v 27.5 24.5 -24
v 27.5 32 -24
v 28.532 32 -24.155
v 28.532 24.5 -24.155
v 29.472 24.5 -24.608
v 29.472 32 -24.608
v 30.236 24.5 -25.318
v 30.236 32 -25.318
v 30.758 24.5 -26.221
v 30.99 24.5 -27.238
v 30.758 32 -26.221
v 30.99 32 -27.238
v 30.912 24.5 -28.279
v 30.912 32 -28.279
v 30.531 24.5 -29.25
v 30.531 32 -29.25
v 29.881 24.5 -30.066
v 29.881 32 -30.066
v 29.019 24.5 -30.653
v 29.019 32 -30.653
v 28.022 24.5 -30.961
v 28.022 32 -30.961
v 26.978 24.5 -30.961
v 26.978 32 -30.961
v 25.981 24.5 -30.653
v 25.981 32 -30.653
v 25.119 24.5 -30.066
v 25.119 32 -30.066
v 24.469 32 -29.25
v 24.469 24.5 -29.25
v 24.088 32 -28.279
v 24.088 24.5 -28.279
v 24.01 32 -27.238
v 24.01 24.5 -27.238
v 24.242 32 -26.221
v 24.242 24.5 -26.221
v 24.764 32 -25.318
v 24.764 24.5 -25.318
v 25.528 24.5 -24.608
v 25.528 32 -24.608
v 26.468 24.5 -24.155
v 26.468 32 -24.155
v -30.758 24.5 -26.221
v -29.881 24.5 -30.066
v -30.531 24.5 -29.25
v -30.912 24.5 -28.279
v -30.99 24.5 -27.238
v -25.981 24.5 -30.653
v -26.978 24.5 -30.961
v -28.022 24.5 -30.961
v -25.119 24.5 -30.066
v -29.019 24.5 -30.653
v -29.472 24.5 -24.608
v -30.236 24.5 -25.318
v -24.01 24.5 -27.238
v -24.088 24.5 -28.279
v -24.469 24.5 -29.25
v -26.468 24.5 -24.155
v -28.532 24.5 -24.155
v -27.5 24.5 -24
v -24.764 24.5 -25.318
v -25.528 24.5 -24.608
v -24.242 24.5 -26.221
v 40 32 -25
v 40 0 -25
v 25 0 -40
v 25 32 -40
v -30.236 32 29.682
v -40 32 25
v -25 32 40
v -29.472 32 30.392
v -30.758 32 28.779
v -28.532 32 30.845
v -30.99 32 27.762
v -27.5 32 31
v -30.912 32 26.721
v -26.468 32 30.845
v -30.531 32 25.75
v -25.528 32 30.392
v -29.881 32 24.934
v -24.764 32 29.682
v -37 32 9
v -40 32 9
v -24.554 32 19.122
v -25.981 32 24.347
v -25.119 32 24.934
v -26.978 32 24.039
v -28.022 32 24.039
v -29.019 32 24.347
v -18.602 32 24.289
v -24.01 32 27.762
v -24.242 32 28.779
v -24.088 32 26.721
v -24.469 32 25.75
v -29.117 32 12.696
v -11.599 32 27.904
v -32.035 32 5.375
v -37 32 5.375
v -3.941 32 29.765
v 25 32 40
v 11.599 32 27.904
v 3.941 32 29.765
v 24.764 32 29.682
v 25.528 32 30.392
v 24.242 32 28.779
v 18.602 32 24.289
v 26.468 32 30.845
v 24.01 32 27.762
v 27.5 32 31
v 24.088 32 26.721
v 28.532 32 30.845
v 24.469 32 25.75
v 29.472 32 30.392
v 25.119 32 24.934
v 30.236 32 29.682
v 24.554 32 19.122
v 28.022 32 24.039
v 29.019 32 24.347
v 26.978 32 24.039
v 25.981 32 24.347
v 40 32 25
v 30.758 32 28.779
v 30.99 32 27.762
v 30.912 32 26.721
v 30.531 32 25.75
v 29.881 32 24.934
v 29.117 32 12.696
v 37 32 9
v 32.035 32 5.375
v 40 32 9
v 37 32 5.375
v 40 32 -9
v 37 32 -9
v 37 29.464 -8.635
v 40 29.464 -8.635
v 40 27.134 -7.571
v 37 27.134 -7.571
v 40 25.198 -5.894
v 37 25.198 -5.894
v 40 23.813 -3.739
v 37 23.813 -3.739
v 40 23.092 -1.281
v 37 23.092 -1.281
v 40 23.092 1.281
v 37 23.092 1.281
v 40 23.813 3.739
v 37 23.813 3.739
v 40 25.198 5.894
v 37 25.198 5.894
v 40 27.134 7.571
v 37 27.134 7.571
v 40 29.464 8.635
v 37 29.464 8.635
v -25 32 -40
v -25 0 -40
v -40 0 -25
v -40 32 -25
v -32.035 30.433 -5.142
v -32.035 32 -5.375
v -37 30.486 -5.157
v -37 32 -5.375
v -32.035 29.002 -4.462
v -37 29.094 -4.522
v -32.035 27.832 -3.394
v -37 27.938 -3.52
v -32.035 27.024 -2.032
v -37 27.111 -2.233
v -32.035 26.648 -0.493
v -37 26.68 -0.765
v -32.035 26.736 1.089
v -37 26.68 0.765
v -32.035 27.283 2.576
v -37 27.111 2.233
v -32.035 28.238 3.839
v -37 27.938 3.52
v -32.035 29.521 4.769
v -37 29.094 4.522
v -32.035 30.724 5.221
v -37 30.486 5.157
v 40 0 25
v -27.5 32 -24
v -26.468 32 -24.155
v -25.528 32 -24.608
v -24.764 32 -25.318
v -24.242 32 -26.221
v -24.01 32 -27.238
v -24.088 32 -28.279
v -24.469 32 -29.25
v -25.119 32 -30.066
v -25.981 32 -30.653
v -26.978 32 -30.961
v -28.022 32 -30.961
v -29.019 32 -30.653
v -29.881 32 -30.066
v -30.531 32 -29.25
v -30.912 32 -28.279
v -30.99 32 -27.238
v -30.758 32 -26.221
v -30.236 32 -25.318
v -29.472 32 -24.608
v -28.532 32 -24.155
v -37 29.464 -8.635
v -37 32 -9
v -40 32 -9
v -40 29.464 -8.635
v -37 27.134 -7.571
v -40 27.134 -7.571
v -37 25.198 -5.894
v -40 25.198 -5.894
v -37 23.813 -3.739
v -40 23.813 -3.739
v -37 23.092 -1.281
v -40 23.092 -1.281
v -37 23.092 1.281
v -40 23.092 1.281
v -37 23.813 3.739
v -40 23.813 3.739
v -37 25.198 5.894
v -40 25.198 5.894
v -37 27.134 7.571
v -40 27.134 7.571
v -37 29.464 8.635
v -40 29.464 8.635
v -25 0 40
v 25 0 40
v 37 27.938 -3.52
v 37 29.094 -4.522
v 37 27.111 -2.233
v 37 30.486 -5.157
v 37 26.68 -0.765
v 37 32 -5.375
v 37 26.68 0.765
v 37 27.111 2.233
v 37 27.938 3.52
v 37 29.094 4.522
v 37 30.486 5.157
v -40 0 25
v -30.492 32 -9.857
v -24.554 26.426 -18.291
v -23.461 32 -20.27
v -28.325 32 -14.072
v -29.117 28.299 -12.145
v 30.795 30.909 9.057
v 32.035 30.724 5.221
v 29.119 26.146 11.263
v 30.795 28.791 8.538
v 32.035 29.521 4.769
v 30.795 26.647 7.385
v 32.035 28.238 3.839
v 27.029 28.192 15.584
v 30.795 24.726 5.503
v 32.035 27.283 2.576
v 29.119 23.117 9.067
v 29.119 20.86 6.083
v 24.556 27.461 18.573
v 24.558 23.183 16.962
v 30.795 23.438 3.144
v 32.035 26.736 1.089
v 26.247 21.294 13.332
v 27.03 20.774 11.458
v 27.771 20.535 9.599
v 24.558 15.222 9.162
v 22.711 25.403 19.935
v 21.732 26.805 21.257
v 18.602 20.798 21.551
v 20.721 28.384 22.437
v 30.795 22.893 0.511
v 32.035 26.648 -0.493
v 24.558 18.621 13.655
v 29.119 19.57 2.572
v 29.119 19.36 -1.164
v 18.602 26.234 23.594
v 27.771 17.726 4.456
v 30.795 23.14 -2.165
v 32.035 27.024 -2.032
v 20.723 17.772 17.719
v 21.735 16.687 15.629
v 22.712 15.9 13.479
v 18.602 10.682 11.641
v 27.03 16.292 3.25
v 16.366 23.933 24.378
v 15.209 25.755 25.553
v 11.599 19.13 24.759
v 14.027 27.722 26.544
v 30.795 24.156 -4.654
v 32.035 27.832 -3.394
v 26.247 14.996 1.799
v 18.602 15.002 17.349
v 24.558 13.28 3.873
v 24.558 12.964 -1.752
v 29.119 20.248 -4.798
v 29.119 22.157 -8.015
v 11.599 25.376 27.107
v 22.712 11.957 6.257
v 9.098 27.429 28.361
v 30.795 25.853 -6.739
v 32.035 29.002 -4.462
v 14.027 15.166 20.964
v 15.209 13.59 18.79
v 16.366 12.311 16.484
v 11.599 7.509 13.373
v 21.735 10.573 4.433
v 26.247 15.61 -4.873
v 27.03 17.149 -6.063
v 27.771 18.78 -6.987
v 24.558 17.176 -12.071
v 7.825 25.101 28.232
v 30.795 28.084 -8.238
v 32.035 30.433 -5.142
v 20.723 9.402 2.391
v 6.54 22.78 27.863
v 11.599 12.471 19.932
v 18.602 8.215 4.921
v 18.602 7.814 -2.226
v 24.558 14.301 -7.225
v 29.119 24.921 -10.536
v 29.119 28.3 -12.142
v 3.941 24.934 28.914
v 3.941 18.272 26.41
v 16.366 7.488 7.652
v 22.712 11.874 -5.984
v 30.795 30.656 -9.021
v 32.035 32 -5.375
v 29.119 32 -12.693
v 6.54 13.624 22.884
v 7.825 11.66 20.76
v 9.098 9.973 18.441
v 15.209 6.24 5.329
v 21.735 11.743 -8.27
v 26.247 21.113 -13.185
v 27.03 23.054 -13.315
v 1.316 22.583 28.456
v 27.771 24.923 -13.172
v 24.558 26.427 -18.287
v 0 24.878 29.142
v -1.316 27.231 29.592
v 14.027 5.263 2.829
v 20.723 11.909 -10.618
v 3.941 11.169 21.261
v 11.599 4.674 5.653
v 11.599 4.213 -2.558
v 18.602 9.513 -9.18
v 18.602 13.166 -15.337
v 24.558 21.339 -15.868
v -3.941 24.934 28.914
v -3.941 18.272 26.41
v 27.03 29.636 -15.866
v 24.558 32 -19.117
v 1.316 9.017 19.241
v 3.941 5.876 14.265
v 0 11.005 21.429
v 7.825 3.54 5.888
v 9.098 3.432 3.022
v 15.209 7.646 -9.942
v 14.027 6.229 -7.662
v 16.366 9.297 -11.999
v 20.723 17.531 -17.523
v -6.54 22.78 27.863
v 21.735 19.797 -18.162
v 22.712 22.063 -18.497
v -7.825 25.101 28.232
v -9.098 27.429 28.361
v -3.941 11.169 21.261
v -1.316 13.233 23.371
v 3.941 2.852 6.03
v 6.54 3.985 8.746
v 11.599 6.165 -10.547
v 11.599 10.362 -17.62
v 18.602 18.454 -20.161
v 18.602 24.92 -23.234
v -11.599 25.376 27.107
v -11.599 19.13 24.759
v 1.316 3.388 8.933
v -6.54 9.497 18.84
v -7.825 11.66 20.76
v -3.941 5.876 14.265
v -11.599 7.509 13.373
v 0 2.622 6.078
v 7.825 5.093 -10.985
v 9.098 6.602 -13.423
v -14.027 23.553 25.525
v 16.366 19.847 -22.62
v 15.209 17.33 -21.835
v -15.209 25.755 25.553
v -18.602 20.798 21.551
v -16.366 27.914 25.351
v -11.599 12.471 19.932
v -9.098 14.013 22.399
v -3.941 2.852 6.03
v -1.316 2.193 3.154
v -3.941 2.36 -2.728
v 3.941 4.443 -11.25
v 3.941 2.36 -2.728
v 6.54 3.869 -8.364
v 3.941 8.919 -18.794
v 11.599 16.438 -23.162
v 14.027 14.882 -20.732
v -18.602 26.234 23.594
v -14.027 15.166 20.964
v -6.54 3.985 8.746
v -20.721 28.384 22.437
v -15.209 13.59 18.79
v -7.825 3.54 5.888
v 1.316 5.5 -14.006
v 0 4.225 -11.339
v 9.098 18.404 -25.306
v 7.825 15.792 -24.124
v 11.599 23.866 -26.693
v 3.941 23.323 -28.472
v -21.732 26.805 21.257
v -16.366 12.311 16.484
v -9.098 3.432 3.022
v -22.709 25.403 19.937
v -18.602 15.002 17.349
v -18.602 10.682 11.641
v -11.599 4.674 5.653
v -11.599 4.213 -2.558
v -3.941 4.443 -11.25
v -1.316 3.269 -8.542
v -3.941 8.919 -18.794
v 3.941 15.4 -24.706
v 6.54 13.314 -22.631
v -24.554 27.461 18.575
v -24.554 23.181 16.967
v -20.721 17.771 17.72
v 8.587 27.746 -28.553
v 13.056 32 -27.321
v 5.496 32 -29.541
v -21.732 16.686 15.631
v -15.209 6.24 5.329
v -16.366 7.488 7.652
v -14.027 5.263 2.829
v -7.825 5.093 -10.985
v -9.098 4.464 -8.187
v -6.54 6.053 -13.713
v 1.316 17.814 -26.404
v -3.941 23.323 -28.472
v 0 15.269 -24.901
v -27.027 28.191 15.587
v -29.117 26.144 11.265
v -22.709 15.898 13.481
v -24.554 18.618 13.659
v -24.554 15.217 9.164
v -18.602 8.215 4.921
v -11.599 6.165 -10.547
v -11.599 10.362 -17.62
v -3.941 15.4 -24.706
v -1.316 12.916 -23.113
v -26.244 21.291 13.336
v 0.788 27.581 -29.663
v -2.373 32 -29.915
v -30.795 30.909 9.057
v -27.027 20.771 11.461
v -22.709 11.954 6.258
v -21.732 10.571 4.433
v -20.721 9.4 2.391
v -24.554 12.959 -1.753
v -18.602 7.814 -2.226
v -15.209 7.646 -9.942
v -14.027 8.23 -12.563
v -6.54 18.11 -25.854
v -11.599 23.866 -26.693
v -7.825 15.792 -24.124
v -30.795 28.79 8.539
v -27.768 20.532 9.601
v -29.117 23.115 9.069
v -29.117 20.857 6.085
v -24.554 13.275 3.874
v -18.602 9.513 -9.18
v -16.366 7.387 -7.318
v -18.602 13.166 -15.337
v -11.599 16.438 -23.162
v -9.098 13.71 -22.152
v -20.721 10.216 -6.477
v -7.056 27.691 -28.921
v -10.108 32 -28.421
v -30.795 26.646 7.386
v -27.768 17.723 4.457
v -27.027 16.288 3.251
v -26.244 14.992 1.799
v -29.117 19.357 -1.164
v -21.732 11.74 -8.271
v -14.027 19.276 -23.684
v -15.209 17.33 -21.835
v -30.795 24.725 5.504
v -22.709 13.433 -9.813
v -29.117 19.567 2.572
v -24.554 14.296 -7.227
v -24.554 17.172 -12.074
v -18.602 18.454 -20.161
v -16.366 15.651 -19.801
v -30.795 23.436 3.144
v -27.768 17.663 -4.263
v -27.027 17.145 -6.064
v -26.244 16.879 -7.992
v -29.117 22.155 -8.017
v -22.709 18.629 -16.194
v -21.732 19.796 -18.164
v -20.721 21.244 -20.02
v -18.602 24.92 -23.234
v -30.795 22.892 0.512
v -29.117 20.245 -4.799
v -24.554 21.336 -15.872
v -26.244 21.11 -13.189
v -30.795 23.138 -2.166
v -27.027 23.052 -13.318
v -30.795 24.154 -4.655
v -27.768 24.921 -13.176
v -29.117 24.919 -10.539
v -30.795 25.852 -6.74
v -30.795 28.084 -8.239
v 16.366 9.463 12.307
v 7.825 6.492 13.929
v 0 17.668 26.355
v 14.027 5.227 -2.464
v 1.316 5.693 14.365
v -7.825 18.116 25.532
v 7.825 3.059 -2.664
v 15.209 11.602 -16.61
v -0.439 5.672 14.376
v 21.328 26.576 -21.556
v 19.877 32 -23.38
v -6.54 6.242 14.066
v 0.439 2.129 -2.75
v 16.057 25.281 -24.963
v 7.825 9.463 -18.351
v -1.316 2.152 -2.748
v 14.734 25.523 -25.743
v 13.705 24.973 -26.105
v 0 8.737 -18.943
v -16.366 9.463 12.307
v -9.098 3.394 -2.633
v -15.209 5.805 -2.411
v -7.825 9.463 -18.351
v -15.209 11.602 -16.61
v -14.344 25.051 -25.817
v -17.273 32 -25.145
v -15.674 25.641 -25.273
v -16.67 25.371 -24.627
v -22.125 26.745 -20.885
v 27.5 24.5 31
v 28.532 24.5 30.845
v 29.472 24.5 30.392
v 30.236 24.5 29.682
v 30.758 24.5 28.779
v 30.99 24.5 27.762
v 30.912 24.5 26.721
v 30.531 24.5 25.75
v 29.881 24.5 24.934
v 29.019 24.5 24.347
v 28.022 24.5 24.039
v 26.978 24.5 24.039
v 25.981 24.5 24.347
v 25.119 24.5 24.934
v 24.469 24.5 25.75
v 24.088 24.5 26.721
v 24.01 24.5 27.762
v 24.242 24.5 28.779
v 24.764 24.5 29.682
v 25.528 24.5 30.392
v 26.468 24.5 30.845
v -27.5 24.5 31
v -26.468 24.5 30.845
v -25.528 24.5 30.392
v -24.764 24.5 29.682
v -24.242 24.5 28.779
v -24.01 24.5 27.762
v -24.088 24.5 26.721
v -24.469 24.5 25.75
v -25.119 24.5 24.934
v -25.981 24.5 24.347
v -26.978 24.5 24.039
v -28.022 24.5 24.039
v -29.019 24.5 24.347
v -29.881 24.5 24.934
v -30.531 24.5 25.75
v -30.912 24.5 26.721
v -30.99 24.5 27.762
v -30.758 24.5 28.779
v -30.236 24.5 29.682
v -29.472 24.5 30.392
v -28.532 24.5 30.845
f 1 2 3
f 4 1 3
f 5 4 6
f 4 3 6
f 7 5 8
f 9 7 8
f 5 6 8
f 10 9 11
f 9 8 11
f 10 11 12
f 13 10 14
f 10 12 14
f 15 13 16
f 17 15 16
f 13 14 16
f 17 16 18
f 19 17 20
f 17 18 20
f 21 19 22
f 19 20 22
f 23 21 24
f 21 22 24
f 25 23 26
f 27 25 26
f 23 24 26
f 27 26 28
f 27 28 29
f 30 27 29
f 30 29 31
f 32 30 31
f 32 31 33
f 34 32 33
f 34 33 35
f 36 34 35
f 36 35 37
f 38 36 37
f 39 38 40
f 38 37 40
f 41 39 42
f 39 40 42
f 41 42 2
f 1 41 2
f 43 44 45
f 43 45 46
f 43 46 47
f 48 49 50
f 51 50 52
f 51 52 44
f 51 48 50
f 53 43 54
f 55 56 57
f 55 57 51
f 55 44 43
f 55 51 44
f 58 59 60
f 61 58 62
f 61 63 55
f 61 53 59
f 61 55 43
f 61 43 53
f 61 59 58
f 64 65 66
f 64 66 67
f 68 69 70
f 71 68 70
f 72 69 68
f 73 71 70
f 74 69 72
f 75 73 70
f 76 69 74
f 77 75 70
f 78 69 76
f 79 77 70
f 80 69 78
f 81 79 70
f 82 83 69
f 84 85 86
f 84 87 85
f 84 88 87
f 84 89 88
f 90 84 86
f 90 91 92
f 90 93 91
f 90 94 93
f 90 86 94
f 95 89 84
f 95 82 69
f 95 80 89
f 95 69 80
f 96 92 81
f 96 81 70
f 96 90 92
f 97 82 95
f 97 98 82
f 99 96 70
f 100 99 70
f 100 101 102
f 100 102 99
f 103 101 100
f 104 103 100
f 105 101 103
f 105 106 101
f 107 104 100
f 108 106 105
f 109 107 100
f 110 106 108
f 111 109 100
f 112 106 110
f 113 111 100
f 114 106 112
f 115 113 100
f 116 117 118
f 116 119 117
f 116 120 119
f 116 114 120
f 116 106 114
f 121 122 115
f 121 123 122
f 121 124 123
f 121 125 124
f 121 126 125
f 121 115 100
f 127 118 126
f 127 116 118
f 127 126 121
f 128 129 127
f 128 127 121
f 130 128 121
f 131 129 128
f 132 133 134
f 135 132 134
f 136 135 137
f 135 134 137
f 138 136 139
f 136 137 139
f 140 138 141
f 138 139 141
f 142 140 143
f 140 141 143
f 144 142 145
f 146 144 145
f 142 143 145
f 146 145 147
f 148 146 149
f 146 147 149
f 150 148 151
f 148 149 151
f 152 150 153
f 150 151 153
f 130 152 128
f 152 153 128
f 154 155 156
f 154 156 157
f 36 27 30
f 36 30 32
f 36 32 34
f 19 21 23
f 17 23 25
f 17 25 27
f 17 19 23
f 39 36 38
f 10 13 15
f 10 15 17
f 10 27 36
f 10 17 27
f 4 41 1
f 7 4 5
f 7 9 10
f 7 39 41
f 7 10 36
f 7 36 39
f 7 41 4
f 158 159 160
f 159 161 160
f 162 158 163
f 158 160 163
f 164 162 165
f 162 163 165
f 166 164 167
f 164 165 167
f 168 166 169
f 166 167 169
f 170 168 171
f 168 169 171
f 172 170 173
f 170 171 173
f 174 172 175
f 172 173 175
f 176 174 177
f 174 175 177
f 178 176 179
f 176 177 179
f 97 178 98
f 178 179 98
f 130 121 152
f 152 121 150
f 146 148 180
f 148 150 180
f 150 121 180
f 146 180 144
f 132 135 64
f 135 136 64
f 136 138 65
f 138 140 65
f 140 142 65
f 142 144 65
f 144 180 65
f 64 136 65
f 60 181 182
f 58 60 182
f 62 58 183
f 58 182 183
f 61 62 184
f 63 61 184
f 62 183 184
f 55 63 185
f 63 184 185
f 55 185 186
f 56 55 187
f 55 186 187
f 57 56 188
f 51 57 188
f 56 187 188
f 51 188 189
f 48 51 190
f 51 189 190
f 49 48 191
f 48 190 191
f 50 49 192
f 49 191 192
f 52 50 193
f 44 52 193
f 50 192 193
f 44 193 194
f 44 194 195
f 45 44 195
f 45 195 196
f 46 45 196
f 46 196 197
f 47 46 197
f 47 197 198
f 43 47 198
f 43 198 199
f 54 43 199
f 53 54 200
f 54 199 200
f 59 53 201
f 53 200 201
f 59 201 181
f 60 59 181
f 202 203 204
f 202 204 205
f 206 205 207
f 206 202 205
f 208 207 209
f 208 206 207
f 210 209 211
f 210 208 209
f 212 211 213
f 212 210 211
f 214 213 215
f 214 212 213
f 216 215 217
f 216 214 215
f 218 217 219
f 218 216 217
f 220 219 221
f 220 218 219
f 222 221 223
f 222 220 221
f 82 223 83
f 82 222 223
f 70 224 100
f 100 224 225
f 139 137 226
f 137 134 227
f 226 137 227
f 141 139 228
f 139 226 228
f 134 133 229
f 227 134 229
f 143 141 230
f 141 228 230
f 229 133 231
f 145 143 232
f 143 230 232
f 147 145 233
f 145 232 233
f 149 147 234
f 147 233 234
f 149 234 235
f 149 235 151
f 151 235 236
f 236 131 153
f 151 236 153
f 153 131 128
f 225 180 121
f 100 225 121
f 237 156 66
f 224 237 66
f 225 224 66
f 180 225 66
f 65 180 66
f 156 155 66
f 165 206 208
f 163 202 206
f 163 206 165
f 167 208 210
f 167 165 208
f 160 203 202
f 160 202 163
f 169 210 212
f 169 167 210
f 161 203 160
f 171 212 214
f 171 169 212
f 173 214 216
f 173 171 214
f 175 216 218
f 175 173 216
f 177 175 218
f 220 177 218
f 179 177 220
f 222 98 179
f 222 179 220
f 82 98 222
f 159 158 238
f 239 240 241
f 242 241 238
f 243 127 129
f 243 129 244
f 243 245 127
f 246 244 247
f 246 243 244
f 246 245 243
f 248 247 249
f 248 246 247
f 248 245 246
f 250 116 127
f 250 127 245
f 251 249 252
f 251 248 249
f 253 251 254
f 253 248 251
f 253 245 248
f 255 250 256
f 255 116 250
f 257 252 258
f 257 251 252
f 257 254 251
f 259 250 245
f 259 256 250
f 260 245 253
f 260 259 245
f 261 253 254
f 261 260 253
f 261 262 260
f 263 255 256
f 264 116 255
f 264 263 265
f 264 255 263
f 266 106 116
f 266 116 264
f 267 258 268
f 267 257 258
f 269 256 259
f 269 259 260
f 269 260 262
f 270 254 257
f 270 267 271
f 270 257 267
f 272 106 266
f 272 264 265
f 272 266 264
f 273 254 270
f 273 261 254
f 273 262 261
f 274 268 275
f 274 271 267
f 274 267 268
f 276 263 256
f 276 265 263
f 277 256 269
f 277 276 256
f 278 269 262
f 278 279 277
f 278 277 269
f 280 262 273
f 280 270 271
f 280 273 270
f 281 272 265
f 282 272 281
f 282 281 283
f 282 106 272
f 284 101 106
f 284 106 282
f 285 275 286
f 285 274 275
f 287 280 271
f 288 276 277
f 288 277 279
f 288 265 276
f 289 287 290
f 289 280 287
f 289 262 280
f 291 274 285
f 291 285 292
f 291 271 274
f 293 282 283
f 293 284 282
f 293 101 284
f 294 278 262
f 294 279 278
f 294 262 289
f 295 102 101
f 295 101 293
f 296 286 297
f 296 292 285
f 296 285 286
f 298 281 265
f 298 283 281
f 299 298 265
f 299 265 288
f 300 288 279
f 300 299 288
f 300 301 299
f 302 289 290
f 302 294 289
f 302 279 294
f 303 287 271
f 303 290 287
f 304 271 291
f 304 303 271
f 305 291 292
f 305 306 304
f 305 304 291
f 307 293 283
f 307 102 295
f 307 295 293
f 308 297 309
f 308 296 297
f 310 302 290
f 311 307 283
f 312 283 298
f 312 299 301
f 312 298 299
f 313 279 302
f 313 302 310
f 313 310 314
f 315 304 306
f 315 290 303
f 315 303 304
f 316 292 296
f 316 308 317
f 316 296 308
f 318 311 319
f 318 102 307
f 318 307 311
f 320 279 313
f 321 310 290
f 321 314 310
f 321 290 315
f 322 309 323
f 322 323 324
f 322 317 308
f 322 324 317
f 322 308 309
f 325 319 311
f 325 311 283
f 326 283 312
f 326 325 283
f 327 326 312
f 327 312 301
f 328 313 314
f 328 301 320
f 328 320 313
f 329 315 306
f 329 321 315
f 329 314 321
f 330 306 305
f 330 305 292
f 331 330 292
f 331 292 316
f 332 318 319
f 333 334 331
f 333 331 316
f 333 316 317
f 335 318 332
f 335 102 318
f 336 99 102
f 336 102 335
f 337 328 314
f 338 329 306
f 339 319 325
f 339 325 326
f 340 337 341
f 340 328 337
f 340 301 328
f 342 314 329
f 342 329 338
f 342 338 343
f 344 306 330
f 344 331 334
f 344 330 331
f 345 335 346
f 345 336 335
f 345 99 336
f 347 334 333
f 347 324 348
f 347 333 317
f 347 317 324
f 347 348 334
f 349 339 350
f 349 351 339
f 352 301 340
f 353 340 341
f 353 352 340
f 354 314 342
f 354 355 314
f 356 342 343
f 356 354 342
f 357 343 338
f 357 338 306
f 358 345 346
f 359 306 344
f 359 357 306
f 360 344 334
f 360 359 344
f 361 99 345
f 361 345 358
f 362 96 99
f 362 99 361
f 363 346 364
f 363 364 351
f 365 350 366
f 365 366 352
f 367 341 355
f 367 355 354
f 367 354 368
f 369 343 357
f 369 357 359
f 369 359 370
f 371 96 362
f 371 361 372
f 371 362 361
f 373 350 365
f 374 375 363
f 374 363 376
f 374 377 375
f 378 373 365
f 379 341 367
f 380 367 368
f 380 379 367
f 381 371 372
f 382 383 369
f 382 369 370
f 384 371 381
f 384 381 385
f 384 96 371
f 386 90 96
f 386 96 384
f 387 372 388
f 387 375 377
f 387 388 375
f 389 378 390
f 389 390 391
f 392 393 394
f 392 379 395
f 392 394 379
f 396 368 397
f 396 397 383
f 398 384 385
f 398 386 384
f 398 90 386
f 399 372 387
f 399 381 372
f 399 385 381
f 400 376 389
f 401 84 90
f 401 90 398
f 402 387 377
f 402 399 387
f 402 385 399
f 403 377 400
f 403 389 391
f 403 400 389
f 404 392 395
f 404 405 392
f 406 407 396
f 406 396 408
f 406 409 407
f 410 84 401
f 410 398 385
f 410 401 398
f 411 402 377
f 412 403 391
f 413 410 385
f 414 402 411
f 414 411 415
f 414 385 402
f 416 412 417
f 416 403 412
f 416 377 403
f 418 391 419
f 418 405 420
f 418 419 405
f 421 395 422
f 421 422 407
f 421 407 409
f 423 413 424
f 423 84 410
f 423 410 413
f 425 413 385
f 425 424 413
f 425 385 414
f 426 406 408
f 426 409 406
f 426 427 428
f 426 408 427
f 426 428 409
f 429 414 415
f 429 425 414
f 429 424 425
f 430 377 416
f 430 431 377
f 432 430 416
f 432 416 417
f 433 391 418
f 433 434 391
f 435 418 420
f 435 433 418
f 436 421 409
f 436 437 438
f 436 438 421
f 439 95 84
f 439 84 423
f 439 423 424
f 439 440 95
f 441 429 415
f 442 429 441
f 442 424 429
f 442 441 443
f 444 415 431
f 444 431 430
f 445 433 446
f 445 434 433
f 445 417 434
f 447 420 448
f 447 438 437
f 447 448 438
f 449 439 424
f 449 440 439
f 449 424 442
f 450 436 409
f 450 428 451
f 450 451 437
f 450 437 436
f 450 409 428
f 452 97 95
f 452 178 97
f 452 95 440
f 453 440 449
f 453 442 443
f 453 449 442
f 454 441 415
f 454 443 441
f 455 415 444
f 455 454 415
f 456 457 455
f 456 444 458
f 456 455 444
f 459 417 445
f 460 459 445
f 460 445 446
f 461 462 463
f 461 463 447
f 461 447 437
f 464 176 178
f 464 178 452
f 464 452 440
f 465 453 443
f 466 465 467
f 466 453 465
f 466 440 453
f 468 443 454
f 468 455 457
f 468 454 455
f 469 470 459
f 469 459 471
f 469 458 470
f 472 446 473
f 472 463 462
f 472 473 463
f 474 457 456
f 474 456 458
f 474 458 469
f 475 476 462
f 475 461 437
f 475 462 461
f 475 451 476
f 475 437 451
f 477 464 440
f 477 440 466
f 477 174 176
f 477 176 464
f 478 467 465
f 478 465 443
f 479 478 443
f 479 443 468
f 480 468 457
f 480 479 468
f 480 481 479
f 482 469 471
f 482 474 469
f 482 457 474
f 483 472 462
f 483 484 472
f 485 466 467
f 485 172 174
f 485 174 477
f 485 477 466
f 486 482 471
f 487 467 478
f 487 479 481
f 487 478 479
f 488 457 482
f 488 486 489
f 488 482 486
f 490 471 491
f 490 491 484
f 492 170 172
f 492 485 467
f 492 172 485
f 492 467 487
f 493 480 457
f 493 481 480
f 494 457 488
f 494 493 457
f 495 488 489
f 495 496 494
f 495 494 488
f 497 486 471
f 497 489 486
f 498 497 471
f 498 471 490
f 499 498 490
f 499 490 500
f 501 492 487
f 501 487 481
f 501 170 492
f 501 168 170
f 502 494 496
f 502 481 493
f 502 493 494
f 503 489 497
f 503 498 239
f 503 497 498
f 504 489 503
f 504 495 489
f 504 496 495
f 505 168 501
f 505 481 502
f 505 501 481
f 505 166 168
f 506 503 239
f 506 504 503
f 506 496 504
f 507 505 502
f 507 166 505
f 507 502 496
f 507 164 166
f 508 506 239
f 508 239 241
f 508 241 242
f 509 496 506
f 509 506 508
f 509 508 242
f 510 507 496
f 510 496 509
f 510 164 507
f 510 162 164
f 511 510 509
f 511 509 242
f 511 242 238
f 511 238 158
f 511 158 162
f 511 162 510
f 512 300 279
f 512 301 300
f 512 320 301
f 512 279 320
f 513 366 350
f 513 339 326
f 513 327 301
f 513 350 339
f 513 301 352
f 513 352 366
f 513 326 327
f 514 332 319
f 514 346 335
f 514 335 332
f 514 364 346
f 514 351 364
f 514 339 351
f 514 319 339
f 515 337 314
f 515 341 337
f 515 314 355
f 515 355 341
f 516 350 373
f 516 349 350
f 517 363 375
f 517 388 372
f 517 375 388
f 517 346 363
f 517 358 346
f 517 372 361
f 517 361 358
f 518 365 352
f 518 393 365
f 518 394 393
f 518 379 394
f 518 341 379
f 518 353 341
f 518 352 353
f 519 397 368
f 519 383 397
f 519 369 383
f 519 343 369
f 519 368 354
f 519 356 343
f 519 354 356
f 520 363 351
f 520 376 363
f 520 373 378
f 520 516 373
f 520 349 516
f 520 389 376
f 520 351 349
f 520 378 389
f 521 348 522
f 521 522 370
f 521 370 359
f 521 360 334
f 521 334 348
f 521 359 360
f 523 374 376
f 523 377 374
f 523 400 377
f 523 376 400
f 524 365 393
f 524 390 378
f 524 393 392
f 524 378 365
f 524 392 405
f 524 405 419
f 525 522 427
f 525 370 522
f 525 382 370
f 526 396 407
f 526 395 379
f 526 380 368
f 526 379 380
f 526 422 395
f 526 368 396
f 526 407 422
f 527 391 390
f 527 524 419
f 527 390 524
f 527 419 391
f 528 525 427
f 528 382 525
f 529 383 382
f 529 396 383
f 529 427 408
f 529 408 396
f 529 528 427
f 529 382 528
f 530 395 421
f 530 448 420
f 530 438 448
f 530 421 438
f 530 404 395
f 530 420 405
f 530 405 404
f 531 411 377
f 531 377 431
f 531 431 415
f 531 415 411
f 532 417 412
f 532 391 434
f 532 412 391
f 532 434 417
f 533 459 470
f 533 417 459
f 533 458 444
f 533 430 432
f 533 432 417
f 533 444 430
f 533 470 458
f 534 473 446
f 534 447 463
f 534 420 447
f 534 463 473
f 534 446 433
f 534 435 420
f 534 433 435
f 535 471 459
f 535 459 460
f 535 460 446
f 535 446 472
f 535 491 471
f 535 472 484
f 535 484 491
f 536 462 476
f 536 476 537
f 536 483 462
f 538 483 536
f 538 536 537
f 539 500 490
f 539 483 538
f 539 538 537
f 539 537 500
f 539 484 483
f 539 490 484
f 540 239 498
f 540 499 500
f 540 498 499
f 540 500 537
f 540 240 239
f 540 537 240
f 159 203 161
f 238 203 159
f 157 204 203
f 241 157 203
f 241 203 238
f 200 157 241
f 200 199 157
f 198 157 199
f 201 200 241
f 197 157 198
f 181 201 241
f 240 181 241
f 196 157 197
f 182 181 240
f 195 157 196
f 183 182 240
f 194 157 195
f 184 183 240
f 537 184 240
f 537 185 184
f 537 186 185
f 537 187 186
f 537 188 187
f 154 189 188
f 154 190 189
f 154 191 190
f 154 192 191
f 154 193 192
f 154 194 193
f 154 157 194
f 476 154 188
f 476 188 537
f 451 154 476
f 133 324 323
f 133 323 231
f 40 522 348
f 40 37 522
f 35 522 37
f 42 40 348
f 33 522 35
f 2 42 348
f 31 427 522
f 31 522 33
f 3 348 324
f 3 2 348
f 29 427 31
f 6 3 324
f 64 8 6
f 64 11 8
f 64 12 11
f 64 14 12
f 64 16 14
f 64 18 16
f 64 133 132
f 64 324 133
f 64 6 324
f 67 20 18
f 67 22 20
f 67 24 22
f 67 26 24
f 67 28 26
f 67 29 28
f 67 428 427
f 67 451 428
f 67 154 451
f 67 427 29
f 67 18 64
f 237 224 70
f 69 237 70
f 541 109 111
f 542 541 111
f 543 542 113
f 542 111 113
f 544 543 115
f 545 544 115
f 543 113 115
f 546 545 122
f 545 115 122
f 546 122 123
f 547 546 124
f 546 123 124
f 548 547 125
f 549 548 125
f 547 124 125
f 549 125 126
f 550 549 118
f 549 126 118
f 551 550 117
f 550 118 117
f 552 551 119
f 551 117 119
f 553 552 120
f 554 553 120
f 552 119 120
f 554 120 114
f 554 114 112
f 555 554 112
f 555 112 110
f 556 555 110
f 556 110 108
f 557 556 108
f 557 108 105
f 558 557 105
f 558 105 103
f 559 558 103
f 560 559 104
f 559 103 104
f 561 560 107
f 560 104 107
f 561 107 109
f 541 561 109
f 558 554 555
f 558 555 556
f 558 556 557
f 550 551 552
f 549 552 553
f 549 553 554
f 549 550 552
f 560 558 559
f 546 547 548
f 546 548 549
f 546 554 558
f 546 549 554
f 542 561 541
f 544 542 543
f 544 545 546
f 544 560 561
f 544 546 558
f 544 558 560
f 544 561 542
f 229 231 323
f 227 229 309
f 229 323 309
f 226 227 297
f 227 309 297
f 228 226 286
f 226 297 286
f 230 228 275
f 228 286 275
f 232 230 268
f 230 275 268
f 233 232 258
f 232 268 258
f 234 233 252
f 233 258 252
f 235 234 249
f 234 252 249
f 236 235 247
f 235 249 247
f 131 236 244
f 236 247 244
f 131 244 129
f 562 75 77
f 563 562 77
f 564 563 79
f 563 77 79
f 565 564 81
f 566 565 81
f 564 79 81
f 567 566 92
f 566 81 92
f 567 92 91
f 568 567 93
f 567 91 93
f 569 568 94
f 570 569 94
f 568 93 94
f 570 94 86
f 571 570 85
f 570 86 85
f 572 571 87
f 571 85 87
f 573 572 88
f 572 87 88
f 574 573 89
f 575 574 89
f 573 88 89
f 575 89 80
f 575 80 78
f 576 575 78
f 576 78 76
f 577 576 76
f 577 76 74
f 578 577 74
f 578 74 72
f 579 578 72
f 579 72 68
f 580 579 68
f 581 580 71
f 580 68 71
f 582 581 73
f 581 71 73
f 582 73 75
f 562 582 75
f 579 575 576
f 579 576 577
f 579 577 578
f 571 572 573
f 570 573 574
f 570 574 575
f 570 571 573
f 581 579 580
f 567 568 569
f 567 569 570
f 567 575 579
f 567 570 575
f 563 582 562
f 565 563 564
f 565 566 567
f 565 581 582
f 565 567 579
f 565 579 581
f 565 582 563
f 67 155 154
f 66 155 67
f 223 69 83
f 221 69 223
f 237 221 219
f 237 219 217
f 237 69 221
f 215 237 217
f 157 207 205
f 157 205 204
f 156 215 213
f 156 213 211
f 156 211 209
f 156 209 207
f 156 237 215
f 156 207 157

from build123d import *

# Parameters (mm, degrees)
SKETCH1_W           = 80
SKETCH1_H           = 80
BOSS_EXTRUDE1_DEPTH = 32
SKETCH3_R           = 5.375
CUT_EXTRUDE1_DEPTH  = 95.994736856
CHAMFER1_SIZE       = 15
SKETCH4_R           = 3.5
CUT_EXTRUDE2_DEPTH  = 7.5
SKETCH5_R           = 9
CUT_EXTRUDE3_DEPTH  = 93.482430925


with BuildPart() as part:
    # Sketch1 → Boss-Extrude1 (new body)
    with BuildSketch(Plane(origin=(0, 0, 0), x_dir=(1, 0, 0), z_dir=(0, 1, 0))):
        Rectangle(SKETCH1_W, SKETCH1_H)
    extrude(amount=BOSS_EXTRUDE1_DEPTH)

    # Sketch2 → Cut-Revolve1 (revolve, cut)
    with BuildSketch(Plane(origin=(0, 32, 0), x_dir=(1, 0, 0), z_dir=(0, 1, 0))):
        with BuildLine():
            Line((-33, 0), (33, 0))
            ThreePointArc((33, 0), (0, -30), (-33, 0))
        make_face()
    revolve(axis=Axis((-33, 32, 0), (1, 0, 0)), mode=Mode.SUBTRACT)

    # Sketch3 → Cut-Extrude1 (cut, through all)
    with BuildSketch(Plane.ZY.offset(40)):
        with Locations((0, 32)):
            Circle(SKETCH3_R)
    extrude(amount=-CUT_EXTRUDE1_DEPTH, mode=Mode.SUBTRACT)

    # Chamfer1
    chamfer1_edges = [part.edges().sort_by_distance(p)[0] for p in [
        (40, 16, 40),
        (-40, 16, 40),
        (-40, 16, -40),
        (40, 16, -40),
    ]]
    chamfer(chamfer1_edges, length=CHAMFER1_SIZE)

    # Sketch4 → Cut-Extrude2 (cut)
    with BuildSketch(Plane(origin=(0, 32, 0), x_dir=(1, 0, 0), z_dir=(0, 1, 0))):
        with Locations(Location((-27.5, 27.5, 0), (0, 0, 270))):
            Circle(SKETCH4_R)
        with Locations(Location((27.5, 27.5, 0), (0, 0, 270))):
            Circle(SKETCH4_R)
        with Locations(Location((27.5, -27.5, 0), (0, 0, 270))):
            Circle(SKETCH4_R)
        with Locations(Location((-27.5, -27.5, 0), (0, 0, 270))):
            Circle(SKETCH4_R)
    extrude(amount=-CUT_EXTRUDE2_DEPTH, mode=Mode.SUBTRACT)

    # Sketch5 → Cut-Extrude3 (cut, through all)
    with BuildSketch(Plane.ZY.offset(37)):
        with Locations((0, 32)):
            Circle(SKETCH5_R)
    cut_extrude3 = extrude(amount=CUT_EXTRUDE3_DEPTH, mode=Mode.SUBTRACT)

    # Mirror1: Cut-Extrude3 across plane
    add(cut_extrude3.mirror(Plane(origin=(0, 0, 0), x_dir=(0, 0, 1), z_dir=(1, 0, 0))), mode=Mode.SUBTRACT)


solid = part.part
